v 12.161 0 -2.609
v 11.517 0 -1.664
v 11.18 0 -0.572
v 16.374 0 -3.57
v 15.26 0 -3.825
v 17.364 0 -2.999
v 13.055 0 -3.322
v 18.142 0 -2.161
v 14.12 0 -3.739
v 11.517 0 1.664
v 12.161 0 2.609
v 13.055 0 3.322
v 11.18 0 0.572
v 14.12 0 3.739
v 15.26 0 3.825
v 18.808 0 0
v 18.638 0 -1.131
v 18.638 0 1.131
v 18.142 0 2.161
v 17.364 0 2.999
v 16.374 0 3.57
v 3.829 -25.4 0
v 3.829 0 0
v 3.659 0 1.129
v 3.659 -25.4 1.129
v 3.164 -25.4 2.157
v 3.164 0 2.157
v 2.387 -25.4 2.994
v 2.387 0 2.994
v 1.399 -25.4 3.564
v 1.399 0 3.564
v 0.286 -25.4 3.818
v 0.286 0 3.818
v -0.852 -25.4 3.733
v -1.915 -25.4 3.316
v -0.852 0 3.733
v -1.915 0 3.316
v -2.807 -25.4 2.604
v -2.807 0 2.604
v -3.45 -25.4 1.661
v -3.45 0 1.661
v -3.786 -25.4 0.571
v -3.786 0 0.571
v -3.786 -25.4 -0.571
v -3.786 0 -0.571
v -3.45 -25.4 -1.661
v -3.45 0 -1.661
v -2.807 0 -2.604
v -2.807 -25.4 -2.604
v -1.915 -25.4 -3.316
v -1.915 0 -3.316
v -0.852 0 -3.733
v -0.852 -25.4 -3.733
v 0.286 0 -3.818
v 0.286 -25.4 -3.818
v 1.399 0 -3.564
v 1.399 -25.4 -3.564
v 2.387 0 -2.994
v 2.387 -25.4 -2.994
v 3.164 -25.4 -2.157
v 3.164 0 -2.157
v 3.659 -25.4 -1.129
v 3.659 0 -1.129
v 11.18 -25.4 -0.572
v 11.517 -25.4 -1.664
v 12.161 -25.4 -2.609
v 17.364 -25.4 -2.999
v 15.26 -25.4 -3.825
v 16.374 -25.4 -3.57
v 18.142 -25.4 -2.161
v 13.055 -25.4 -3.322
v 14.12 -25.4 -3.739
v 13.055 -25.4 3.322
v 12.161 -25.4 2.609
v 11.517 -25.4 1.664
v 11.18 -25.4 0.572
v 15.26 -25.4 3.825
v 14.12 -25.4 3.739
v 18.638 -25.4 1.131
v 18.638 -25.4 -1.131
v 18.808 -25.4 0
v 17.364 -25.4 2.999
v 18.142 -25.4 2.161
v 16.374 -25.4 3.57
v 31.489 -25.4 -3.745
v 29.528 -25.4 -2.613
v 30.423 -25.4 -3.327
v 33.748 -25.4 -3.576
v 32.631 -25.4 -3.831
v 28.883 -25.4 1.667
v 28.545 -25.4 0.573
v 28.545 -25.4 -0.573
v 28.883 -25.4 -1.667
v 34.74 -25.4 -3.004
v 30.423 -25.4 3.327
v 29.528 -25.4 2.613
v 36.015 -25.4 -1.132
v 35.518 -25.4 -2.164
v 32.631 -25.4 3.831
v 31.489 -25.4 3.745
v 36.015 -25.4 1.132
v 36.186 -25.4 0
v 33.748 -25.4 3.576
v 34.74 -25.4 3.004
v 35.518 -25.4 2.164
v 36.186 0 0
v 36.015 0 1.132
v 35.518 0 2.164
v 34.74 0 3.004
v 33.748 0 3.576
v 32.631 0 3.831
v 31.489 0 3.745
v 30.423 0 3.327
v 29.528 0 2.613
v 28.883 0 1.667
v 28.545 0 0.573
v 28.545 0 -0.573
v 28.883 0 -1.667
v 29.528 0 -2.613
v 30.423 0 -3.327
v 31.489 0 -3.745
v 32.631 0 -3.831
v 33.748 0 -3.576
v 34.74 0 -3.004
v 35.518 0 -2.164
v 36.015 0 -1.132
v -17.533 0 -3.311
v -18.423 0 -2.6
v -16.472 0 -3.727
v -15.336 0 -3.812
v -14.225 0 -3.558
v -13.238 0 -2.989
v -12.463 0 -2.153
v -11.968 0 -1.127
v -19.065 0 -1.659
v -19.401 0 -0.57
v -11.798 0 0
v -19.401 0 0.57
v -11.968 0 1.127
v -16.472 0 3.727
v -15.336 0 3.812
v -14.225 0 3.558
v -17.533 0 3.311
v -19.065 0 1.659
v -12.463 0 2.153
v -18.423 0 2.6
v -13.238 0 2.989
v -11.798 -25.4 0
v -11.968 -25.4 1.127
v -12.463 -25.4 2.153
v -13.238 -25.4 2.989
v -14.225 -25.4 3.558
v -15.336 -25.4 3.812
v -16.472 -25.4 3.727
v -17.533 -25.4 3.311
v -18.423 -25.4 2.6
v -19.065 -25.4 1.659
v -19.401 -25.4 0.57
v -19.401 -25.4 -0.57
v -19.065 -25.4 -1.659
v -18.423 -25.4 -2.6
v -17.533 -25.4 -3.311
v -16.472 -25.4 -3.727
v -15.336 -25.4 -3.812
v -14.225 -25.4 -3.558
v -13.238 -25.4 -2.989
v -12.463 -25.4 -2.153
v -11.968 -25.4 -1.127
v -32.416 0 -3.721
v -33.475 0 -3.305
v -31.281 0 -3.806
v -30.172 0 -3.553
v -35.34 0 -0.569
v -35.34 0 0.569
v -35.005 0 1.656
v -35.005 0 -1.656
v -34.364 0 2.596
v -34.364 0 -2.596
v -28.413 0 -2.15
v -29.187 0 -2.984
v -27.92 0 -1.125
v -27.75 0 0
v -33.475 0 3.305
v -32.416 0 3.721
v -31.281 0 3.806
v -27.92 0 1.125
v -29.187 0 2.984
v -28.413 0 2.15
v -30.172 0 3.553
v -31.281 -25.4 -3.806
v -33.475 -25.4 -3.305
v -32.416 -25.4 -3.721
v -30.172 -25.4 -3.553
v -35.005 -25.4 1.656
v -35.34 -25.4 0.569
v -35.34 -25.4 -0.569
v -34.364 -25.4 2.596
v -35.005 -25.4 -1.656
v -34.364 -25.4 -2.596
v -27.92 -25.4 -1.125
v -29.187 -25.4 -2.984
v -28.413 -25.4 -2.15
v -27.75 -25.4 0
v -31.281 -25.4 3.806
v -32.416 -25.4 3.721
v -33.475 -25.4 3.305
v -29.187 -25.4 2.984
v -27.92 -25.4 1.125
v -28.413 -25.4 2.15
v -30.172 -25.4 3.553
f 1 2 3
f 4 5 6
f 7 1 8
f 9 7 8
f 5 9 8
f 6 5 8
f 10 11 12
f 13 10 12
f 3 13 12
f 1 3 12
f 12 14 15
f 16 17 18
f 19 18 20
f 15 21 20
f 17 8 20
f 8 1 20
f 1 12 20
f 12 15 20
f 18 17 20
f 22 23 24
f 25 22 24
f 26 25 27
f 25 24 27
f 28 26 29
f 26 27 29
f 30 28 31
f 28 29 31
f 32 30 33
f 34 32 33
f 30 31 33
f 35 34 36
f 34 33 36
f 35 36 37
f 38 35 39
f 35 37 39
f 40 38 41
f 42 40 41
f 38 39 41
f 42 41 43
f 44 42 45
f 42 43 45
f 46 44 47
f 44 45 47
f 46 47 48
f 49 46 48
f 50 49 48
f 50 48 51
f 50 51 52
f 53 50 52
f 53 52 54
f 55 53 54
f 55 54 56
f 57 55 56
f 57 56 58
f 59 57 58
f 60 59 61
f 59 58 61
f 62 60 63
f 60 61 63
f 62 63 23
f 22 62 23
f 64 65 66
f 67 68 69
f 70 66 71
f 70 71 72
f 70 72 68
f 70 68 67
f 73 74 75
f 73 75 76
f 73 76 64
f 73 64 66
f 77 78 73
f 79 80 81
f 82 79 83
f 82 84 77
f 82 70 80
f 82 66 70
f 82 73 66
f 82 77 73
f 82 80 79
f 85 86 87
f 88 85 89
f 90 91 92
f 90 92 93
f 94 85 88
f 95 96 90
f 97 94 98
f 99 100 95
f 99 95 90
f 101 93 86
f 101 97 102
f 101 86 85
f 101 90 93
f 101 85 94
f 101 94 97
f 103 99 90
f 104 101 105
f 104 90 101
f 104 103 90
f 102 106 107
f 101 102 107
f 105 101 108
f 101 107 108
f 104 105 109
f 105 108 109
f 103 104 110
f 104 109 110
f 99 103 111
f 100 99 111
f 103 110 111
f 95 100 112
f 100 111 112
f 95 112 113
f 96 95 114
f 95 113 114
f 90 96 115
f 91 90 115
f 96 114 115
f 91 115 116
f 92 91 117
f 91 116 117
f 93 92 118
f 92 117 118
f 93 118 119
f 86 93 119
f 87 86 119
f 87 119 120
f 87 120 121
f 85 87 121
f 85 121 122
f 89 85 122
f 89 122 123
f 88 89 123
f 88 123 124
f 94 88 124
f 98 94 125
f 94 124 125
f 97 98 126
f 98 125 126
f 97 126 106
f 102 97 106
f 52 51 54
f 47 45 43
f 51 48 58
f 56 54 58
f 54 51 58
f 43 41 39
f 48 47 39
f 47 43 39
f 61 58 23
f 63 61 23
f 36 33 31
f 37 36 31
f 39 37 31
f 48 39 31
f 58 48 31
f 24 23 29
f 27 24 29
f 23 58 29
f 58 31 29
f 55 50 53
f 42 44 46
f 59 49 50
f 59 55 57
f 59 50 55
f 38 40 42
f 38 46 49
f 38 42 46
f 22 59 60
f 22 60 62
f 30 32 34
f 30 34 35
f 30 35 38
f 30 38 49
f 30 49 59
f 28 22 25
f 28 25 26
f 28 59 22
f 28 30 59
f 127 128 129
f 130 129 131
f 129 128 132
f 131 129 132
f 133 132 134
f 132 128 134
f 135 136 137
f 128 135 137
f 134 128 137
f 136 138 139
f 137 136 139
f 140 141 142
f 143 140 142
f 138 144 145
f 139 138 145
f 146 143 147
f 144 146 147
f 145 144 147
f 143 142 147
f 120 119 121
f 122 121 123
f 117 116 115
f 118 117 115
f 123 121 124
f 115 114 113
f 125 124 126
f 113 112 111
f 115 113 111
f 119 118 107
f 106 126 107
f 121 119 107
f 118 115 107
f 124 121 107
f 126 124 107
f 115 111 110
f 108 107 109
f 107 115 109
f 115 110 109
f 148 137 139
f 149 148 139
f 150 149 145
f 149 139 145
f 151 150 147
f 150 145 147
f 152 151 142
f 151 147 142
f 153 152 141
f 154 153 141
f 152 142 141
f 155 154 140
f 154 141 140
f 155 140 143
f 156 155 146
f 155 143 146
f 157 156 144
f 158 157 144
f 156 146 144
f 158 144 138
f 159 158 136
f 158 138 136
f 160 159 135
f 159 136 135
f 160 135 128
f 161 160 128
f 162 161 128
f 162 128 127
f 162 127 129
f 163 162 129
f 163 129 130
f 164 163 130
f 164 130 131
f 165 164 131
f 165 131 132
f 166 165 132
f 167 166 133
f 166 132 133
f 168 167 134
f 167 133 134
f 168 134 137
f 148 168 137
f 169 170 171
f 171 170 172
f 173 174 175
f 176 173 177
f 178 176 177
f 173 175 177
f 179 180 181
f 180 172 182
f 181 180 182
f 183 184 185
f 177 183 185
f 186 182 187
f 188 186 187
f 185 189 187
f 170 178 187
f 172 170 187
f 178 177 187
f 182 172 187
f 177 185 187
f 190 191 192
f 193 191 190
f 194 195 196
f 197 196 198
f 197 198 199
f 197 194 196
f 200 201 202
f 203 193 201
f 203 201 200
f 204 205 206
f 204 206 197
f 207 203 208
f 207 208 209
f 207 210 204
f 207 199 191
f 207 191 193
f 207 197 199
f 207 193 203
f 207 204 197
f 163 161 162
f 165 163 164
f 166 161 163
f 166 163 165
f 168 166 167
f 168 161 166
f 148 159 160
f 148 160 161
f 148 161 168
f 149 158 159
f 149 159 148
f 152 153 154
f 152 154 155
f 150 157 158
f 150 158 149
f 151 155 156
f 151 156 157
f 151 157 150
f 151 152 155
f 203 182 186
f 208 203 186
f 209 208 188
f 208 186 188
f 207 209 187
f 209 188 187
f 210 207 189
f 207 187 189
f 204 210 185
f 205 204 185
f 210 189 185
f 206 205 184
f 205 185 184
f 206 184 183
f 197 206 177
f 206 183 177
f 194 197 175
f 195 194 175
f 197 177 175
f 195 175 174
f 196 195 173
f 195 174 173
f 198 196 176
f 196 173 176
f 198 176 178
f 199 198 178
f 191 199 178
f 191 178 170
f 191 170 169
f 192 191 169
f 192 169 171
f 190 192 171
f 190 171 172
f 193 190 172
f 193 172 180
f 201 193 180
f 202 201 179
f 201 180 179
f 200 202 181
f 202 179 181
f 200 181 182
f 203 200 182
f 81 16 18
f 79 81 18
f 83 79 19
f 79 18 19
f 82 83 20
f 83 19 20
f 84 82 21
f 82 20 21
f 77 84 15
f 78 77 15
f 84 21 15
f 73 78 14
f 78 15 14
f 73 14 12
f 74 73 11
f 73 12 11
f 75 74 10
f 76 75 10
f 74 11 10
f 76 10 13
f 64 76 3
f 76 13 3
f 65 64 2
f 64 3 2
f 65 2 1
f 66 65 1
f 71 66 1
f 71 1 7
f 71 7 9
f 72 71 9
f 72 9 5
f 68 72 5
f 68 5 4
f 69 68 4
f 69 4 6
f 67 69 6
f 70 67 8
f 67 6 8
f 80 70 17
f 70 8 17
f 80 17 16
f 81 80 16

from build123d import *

# Parameters (mm, degrees)
F0_R     = 3.81635
F0_R_2   = 3.8227
F0_R_3   = 3.82905
F0_R_4   = 3.8354
F0_R_5   = 3.84175
F1_DEPTH = 25.4


with BuildPart() as f1:
    # F0 (on Front) → F1 (new body)
    with BuildSketch(Plane.XZ):
        with Locations((-31.566447, 0)):
            Circle(F0_R)
        with Locations((-15.621179, 0)):
            Circle(F0_R_2)
        Circle(F0_R_3)
        with Locations((14.972998, 0)):
            Circle(F0_R_4)
        with Locations((32.344271, 0)):
            Circle(F0_R_5)
    extrude(amount=F1_DEPTH)


solid = f1.part
